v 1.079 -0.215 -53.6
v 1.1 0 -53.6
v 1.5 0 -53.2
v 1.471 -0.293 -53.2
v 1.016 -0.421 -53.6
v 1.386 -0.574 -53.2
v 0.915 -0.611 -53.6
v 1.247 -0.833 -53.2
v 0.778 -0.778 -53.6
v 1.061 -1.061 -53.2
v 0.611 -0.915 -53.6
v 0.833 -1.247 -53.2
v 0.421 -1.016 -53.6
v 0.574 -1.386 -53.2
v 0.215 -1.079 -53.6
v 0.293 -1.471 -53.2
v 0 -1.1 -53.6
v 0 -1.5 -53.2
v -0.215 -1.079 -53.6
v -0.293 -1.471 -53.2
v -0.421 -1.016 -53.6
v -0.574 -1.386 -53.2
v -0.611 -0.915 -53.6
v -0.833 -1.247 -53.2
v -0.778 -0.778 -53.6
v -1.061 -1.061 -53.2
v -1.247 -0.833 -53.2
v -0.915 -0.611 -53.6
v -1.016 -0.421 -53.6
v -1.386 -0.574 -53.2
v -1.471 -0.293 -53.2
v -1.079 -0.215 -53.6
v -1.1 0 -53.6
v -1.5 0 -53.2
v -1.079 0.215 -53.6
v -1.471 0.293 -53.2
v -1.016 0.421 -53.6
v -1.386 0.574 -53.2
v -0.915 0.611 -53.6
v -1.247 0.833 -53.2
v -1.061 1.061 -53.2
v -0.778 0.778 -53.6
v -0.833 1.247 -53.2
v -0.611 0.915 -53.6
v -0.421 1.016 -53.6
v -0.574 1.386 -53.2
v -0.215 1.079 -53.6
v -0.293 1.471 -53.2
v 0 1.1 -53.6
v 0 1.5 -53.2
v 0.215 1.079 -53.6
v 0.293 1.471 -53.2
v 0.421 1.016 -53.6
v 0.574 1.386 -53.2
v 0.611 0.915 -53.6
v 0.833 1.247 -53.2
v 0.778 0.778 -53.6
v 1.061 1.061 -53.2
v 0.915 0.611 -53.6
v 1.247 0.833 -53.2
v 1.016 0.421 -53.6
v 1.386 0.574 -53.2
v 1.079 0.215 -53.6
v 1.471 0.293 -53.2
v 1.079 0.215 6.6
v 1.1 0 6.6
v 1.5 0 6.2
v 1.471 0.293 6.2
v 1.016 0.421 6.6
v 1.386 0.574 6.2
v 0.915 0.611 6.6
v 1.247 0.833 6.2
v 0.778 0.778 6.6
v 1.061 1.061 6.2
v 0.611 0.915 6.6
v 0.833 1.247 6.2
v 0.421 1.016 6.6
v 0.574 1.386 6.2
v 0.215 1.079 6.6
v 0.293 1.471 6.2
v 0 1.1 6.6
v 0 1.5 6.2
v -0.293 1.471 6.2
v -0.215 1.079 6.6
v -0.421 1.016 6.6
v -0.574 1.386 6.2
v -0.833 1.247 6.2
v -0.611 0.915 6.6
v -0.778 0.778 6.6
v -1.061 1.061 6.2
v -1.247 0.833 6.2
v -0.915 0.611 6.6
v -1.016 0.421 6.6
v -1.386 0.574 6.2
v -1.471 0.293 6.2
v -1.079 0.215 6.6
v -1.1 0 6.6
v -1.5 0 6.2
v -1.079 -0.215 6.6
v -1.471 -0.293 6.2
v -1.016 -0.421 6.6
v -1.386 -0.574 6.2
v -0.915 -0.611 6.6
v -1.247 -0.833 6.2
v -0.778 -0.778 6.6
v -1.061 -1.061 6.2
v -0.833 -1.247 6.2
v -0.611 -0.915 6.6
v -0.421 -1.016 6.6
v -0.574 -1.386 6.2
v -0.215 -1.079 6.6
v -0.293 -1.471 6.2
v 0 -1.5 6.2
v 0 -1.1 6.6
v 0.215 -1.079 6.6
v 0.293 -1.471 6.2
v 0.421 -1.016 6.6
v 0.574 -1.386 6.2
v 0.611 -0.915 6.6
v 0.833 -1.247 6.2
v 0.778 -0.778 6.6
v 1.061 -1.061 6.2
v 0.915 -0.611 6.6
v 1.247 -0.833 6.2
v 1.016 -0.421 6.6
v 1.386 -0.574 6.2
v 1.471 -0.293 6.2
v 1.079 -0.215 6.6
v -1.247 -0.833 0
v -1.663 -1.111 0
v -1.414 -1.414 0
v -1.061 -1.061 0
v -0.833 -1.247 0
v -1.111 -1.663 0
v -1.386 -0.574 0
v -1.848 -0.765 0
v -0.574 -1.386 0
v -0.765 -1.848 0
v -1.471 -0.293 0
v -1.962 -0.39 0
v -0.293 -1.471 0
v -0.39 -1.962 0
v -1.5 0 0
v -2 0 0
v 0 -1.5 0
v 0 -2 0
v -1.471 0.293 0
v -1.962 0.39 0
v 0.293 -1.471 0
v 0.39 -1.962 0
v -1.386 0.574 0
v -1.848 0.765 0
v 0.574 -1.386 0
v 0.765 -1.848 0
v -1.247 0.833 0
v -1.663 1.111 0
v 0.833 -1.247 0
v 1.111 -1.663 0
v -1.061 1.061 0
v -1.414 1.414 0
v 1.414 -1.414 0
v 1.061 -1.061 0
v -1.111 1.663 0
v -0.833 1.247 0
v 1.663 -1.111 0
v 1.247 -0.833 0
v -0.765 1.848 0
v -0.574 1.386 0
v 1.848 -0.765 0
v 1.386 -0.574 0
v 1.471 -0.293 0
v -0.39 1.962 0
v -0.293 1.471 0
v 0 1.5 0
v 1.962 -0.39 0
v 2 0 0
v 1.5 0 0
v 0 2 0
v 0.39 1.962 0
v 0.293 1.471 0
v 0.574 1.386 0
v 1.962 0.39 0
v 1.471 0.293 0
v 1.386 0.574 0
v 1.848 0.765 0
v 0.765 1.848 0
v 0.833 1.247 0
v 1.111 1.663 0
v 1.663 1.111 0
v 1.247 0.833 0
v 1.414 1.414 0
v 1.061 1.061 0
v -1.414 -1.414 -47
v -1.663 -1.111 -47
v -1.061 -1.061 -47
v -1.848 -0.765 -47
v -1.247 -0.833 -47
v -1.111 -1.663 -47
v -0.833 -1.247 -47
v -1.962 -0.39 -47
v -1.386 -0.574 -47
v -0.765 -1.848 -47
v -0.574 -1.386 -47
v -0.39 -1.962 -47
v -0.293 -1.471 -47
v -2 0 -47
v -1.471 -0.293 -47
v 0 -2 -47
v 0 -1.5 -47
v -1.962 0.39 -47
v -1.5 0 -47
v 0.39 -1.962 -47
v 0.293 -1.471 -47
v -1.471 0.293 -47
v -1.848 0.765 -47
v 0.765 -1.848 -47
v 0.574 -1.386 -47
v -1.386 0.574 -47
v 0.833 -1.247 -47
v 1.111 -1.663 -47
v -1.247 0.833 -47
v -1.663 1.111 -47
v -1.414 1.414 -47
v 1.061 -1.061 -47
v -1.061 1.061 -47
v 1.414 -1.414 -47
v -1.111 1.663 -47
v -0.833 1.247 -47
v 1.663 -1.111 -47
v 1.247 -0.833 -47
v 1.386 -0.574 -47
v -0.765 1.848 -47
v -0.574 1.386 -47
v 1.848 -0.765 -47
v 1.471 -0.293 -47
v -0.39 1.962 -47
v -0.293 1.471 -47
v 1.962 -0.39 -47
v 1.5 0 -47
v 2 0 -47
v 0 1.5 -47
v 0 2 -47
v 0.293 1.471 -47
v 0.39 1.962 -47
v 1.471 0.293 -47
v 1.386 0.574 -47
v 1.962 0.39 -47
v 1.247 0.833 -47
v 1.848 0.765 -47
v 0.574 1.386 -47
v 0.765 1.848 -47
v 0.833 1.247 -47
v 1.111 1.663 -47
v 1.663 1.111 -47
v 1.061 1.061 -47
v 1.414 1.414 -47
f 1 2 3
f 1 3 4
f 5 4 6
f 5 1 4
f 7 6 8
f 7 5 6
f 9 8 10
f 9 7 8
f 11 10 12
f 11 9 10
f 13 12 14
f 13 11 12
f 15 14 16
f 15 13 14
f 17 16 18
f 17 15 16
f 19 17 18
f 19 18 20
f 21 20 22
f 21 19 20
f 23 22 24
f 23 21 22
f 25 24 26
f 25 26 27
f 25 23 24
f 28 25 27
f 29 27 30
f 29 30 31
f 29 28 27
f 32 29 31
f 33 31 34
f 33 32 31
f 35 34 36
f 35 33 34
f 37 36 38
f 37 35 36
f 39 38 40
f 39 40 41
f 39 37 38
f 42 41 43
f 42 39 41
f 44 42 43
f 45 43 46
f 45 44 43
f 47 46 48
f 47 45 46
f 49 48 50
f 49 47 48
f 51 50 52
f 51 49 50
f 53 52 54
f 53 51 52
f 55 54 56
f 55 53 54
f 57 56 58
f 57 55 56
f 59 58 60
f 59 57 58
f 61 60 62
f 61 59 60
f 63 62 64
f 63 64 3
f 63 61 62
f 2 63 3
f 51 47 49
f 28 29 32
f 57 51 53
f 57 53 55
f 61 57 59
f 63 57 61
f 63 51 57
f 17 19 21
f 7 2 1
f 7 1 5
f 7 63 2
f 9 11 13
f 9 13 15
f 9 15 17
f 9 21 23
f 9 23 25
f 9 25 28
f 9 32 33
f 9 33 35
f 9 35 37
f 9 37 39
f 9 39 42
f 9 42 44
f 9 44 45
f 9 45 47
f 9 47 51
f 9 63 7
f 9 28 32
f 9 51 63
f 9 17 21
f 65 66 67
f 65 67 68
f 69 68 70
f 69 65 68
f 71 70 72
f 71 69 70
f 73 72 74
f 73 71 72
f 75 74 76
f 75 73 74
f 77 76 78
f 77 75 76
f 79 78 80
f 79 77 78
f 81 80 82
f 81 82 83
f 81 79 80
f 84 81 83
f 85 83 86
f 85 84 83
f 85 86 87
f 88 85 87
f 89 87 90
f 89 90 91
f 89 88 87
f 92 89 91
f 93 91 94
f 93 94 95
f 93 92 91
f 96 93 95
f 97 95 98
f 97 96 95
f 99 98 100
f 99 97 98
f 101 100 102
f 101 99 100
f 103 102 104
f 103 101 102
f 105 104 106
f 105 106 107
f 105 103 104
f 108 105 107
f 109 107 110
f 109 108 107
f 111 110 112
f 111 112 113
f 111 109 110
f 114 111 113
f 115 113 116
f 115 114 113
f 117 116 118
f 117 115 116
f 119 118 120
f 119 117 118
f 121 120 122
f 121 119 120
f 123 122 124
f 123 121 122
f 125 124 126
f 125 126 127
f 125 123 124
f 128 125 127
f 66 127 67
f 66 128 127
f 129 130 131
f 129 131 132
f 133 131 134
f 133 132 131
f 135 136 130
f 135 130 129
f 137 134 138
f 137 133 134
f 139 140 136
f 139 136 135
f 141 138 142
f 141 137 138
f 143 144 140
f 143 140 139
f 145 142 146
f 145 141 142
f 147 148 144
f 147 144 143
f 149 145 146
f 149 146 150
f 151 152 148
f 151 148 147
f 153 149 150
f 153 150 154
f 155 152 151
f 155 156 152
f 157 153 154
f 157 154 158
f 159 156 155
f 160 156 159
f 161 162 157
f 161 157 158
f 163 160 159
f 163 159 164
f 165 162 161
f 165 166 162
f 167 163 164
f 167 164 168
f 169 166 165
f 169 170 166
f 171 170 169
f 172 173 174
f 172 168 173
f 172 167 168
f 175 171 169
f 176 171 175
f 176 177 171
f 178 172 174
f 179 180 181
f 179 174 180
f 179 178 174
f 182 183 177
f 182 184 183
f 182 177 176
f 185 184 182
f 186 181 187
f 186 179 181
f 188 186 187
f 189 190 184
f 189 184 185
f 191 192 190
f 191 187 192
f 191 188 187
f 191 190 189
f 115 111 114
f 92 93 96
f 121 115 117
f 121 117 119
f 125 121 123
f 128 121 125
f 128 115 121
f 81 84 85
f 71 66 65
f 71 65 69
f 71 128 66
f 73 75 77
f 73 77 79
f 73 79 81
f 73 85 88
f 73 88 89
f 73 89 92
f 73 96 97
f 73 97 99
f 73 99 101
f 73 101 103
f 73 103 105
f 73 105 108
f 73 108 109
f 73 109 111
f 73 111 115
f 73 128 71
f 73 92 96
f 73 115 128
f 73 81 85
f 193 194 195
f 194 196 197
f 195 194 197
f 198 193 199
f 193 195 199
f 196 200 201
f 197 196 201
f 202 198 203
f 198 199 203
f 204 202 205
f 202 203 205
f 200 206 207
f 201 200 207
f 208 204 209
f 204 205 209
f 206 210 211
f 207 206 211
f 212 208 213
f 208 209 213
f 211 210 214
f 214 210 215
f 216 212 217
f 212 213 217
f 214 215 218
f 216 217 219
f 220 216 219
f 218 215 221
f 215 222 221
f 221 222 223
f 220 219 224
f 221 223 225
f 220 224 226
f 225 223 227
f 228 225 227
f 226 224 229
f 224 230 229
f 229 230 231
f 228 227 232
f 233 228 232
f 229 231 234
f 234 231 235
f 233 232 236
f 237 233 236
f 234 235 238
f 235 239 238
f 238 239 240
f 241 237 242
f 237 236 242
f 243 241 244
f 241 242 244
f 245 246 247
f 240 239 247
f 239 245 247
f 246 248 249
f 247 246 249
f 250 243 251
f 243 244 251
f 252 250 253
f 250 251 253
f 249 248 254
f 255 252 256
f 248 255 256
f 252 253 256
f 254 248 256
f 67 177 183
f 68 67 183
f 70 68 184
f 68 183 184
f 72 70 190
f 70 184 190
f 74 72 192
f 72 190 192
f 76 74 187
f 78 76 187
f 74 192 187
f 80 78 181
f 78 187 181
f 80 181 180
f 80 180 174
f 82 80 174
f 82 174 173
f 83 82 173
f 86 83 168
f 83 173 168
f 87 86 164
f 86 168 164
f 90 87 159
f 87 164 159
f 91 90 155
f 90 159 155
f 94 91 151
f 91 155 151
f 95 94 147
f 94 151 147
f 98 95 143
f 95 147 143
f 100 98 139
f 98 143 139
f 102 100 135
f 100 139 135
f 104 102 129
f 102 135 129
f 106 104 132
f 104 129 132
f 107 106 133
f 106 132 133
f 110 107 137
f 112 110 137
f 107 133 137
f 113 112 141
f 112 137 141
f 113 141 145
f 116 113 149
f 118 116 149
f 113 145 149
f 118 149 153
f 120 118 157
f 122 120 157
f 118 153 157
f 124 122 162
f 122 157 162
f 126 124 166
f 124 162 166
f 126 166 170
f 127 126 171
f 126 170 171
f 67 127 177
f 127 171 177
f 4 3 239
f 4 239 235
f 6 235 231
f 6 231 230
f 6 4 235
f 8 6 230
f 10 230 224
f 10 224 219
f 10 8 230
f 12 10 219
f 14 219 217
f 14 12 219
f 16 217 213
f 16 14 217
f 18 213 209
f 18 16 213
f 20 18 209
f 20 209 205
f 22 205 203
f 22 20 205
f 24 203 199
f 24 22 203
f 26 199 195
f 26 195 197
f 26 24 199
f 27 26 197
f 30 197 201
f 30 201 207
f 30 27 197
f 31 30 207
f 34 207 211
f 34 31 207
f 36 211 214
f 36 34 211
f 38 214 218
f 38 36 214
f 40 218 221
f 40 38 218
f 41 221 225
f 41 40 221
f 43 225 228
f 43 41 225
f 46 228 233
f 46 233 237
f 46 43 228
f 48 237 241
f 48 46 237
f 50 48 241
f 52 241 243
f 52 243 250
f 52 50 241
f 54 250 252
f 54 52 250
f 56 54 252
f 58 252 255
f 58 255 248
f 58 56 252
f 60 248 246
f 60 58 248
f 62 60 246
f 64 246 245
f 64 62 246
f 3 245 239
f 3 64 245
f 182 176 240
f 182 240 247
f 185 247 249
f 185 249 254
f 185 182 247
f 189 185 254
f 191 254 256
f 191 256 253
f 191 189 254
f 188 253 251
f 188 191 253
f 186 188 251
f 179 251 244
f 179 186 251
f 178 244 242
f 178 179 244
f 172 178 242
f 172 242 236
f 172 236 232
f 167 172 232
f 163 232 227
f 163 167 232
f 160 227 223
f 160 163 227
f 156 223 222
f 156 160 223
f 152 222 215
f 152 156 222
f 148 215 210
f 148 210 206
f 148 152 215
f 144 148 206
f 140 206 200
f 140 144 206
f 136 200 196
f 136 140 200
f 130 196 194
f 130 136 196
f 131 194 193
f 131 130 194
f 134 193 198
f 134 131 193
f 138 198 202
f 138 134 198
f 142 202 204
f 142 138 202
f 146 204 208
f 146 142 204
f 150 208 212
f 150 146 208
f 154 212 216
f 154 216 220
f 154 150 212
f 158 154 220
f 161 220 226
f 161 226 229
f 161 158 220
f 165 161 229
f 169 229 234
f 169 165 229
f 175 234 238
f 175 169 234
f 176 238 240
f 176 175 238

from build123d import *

# Parameters (mm, degrees)
SKETCH1_R           = 2
BOSS_EXTRUDE1_DEPTH = 47
SKETCH2_R           = 1.5
BOSS_EXTRUDE2_DEPTH = 6.6
BOSS_EXTRUDE3_START = 6.6
SKETCH3_R           = 1.5
BOSS_EXTRUDE3_DEPTH = 6.6
CHAMFER1_SIZE       = 0.4


with BuildPart() as part:
    # Sketch1 → Boss-Extrude1 (new body)
    with BuildSketch(Plane.XY):
        Circle(SKETCH1_R)
    extrude(amount=-BOSS_EXTRUDE1_DEPTH)

    # Sketch2 → Boss-Extrude2 (add)
    with BuildSketch(Plane.XY):
        Circle(SKETCH2_R)
    extrude(amount=BOSS_EXTRUDE2_DEPTH)

    # Sketch3 → Boss-Extrude3 (add)
    with BuildSketch(Plane(origin=(0, 0, -47), x_dir=(-1, 0, 0), z_dir=(0, 0, -1)).offset(BOSS_EXTRUDE3_START)):
        with Locations(Location((0, 0, 0), (0, 0, 180))):
            Circle(SKETCH3_R)
    extrude(amount=-BOSS_EXTRUDE3_DEPTH)

    # Chamfer1
    chamfer1_edges = [part.edges().sort_by_distance(p)[0] for p in [
        (-1.5, 0, -53.6),
        (-1.5, 0, 6.6),
    ]]
    chamfer(chamfer1_edges, length=CHAMFER1_SIZE)


solid = part.part
